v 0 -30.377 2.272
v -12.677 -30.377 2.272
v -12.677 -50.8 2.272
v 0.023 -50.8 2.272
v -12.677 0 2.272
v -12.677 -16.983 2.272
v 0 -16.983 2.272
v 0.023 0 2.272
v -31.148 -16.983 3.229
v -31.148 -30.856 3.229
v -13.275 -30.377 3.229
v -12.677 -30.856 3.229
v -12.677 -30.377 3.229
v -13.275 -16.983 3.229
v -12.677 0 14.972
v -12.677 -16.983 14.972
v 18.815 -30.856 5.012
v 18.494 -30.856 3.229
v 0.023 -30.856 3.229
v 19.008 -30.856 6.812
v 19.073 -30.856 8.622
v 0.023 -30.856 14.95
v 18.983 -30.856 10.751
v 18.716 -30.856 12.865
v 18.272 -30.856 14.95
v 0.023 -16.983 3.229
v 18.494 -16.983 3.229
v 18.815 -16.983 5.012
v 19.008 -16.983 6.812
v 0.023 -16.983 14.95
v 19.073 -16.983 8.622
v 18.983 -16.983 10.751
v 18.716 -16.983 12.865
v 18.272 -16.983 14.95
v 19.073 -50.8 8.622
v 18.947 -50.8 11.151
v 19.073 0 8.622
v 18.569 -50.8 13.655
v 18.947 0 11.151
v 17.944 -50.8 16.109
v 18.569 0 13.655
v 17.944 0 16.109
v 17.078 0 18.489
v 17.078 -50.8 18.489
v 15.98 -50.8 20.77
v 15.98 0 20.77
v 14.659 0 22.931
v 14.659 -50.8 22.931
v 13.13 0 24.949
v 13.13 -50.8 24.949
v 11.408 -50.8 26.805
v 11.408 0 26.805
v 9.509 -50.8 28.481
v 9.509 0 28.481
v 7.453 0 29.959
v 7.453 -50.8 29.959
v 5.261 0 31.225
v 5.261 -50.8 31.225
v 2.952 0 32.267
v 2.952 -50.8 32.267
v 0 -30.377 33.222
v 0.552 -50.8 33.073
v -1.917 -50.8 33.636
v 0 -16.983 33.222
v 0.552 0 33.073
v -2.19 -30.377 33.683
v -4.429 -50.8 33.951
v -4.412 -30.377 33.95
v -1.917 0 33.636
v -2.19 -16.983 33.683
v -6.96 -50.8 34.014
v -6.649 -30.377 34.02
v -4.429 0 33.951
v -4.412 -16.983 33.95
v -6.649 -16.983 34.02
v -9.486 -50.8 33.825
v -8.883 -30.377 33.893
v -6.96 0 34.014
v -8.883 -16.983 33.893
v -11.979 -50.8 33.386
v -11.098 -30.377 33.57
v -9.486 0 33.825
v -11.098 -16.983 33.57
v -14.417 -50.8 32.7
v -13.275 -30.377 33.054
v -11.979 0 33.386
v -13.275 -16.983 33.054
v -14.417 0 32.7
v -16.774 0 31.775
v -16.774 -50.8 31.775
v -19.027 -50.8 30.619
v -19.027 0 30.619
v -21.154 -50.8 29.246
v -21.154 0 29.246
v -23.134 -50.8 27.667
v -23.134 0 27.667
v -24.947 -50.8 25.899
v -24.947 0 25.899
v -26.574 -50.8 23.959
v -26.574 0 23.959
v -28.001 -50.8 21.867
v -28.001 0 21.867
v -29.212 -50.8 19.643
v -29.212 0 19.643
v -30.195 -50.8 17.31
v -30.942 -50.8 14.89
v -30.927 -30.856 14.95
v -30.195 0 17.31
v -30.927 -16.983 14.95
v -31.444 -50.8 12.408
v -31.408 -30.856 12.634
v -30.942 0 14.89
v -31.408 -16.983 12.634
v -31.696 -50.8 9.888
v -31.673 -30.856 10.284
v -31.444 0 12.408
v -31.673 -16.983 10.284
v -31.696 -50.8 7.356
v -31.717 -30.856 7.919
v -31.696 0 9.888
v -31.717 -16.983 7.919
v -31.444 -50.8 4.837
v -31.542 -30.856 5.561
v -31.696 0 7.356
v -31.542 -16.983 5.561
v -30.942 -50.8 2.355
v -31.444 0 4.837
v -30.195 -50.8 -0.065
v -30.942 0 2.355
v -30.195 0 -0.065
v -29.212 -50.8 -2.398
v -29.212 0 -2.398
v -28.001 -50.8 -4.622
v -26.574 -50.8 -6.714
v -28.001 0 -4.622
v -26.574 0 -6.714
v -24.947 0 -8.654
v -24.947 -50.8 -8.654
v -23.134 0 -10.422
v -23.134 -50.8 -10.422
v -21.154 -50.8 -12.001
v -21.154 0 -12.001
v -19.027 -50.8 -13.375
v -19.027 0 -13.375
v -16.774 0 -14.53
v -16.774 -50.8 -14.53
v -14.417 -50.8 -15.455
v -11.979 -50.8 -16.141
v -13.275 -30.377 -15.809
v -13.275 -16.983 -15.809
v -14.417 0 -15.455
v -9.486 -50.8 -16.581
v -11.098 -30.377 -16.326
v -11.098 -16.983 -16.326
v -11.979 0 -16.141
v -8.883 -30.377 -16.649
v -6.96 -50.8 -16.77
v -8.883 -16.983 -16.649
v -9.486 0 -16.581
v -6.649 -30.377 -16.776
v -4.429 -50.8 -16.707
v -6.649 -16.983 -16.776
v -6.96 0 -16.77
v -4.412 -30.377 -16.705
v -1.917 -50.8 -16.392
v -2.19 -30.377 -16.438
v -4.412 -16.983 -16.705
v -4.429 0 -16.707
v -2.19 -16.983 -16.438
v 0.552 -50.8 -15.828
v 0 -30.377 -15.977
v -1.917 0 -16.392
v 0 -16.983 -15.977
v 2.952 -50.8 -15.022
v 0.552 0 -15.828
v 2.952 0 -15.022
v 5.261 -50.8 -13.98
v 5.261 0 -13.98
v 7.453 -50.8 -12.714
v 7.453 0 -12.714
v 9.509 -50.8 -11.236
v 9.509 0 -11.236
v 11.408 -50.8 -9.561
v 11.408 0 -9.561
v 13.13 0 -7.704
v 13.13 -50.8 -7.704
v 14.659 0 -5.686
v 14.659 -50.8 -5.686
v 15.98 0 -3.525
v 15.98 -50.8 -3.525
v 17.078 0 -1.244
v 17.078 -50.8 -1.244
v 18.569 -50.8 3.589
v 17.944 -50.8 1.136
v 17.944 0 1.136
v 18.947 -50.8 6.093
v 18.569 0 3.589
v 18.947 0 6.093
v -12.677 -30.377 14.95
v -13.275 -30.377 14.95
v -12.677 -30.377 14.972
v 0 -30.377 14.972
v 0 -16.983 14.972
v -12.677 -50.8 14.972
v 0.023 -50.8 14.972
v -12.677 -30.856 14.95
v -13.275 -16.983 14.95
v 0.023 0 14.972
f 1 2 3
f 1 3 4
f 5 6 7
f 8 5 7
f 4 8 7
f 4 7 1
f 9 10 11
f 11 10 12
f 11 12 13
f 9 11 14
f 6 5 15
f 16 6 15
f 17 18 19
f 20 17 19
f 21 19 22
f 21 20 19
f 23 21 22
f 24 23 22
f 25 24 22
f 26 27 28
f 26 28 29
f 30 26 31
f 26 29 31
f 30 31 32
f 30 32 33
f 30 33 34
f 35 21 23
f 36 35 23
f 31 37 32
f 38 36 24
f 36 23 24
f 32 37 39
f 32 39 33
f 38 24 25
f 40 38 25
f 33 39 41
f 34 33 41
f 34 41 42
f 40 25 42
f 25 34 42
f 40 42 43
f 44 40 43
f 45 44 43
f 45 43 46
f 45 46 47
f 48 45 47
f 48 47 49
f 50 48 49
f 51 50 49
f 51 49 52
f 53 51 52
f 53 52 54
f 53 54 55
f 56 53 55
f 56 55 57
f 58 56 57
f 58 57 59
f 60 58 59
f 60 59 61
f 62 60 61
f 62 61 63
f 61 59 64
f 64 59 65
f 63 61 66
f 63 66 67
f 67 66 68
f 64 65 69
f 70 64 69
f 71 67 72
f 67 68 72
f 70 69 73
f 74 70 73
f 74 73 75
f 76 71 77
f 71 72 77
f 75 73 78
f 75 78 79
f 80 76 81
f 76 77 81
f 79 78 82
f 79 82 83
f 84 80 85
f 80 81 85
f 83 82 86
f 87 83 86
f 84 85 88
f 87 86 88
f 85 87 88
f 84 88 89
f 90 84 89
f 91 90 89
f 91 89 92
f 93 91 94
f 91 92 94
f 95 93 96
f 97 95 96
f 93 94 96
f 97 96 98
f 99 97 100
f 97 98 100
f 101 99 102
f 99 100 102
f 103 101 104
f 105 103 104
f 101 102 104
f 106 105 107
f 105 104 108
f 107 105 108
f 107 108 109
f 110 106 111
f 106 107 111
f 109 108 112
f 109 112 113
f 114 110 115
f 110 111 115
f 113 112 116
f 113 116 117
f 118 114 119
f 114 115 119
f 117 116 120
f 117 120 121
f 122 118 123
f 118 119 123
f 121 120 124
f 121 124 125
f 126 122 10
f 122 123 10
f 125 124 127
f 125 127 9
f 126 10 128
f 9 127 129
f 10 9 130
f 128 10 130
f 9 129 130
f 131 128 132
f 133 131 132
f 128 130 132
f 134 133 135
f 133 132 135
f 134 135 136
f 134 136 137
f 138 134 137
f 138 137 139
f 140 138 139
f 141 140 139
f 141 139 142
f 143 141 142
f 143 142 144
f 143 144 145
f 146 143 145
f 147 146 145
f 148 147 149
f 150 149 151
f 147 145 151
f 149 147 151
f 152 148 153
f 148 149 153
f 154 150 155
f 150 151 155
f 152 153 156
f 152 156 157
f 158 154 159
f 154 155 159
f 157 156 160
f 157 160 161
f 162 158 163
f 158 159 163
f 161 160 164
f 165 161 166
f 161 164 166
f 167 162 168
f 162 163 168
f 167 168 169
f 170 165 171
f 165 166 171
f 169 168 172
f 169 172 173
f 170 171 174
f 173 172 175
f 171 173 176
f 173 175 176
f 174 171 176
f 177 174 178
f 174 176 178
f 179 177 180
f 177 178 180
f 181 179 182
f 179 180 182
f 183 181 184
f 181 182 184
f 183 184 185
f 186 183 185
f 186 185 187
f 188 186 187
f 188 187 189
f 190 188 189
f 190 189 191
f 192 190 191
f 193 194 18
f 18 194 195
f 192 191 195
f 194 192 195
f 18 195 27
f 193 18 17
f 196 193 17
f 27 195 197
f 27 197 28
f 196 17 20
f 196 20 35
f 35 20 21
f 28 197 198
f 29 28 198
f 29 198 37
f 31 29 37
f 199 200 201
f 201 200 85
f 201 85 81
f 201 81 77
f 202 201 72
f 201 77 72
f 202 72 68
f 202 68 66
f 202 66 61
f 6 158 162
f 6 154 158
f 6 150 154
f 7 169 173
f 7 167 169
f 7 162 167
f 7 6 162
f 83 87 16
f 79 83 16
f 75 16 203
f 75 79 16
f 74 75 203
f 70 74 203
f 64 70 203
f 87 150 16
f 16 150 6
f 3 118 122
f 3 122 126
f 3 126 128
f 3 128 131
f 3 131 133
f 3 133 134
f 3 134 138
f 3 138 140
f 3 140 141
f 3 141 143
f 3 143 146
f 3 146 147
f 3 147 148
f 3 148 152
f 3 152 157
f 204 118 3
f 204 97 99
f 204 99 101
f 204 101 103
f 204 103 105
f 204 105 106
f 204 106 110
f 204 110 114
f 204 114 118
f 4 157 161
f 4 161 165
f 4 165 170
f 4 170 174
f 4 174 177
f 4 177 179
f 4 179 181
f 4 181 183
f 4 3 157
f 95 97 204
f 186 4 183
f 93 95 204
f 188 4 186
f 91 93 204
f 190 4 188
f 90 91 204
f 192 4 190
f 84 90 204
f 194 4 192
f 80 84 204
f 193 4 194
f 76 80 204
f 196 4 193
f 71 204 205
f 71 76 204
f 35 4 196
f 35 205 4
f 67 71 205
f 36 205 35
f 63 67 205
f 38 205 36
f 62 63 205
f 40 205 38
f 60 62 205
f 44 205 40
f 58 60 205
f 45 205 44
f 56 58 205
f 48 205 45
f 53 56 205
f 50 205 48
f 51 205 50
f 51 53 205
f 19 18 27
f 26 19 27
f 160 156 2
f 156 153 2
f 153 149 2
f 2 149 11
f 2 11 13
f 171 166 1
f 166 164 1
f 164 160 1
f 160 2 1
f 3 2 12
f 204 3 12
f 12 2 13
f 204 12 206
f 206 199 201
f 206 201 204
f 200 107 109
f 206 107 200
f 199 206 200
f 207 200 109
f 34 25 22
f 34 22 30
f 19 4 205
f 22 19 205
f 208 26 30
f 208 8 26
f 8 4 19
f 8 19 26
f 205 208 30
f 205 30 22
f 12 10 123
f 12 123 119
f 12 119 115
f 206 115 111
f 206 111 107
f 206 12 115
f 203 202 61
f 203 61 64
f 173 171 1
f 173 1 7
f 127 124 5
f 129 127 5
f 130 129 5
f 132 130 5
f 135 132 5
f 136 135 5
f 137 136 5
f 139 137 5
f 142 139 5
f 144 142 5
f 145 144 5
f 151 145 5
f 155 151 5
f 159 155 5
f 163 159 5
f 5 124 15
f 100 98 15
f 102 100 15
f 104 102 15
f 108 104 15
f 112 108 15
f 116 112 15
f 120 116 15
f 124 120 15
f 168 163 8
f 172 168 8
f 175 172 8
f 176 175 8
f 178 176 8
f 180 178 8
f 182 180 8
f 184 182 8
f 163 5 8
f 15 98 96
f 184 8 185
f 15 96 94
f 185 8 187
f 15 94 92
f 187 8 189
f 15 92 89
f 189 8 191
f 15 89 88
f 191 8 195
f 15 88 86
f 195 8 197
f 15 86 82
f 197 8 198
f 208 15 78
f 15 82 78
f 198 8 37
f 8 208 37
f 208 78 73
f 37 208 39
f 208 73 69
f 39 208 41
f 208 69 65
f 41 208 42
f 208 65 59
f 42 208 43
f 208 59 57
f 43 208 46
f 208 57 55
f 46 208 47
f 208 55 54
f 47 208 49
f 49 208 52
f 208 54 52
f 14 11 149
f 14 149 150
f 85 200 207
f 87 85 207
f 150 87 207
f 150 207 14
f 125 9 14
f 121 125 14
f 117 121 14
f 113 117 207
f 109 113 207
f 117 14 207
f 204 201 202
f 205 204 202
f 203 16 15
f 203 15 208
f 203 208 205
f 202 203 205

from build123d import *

# Parameters (mm, degrees)
F0_R     = 25.4
F0_W     = 12.7
F0_H     = 12.7
F1_DEPTH = 50.8
F2_W     = 13.873184
F2_H     = 11.720448
F3_DEPTH = 50.8
F4_W     = 13.275202
F4_H     = 13.394801
F5_DEPTH = 50.8


with BuildPart() as f1:
    # F0 (on Front) → F1 (new body)
    with BuildSketch(Plane.XZ):
        with Locations((-6.32722, 8.622332)):
            Circle(F0_R)
        with Locations((-6.32722, 8.622332)):
            Rectangle(F0_W, F0_H, mode=Mode.SUBTRACT)
    extrude(amount=F1_DEPTH)

    # F2 (on Right) → F3 (cut, symmetric)
    with BuildSketch(Plane.YZ):
        with Locations((-23.919283, 9.089327)):
            Rectangle(F2_W, F2_H)
    extrude(amount=F3_DEPTH, both=True, mode=Mode.SUBTRACT)

    # F4 (on Top) → F5 (cut, symmetric)
    with BuildSketch(Plane.XY):
        with Locations((-6.637601, -23.68009)):
            Rectangle(F4_W, F4_H)
    extrude(amount=F5_DEPTH, both=True, mode=Mode.SUBTRACT)


solid = f1.part
